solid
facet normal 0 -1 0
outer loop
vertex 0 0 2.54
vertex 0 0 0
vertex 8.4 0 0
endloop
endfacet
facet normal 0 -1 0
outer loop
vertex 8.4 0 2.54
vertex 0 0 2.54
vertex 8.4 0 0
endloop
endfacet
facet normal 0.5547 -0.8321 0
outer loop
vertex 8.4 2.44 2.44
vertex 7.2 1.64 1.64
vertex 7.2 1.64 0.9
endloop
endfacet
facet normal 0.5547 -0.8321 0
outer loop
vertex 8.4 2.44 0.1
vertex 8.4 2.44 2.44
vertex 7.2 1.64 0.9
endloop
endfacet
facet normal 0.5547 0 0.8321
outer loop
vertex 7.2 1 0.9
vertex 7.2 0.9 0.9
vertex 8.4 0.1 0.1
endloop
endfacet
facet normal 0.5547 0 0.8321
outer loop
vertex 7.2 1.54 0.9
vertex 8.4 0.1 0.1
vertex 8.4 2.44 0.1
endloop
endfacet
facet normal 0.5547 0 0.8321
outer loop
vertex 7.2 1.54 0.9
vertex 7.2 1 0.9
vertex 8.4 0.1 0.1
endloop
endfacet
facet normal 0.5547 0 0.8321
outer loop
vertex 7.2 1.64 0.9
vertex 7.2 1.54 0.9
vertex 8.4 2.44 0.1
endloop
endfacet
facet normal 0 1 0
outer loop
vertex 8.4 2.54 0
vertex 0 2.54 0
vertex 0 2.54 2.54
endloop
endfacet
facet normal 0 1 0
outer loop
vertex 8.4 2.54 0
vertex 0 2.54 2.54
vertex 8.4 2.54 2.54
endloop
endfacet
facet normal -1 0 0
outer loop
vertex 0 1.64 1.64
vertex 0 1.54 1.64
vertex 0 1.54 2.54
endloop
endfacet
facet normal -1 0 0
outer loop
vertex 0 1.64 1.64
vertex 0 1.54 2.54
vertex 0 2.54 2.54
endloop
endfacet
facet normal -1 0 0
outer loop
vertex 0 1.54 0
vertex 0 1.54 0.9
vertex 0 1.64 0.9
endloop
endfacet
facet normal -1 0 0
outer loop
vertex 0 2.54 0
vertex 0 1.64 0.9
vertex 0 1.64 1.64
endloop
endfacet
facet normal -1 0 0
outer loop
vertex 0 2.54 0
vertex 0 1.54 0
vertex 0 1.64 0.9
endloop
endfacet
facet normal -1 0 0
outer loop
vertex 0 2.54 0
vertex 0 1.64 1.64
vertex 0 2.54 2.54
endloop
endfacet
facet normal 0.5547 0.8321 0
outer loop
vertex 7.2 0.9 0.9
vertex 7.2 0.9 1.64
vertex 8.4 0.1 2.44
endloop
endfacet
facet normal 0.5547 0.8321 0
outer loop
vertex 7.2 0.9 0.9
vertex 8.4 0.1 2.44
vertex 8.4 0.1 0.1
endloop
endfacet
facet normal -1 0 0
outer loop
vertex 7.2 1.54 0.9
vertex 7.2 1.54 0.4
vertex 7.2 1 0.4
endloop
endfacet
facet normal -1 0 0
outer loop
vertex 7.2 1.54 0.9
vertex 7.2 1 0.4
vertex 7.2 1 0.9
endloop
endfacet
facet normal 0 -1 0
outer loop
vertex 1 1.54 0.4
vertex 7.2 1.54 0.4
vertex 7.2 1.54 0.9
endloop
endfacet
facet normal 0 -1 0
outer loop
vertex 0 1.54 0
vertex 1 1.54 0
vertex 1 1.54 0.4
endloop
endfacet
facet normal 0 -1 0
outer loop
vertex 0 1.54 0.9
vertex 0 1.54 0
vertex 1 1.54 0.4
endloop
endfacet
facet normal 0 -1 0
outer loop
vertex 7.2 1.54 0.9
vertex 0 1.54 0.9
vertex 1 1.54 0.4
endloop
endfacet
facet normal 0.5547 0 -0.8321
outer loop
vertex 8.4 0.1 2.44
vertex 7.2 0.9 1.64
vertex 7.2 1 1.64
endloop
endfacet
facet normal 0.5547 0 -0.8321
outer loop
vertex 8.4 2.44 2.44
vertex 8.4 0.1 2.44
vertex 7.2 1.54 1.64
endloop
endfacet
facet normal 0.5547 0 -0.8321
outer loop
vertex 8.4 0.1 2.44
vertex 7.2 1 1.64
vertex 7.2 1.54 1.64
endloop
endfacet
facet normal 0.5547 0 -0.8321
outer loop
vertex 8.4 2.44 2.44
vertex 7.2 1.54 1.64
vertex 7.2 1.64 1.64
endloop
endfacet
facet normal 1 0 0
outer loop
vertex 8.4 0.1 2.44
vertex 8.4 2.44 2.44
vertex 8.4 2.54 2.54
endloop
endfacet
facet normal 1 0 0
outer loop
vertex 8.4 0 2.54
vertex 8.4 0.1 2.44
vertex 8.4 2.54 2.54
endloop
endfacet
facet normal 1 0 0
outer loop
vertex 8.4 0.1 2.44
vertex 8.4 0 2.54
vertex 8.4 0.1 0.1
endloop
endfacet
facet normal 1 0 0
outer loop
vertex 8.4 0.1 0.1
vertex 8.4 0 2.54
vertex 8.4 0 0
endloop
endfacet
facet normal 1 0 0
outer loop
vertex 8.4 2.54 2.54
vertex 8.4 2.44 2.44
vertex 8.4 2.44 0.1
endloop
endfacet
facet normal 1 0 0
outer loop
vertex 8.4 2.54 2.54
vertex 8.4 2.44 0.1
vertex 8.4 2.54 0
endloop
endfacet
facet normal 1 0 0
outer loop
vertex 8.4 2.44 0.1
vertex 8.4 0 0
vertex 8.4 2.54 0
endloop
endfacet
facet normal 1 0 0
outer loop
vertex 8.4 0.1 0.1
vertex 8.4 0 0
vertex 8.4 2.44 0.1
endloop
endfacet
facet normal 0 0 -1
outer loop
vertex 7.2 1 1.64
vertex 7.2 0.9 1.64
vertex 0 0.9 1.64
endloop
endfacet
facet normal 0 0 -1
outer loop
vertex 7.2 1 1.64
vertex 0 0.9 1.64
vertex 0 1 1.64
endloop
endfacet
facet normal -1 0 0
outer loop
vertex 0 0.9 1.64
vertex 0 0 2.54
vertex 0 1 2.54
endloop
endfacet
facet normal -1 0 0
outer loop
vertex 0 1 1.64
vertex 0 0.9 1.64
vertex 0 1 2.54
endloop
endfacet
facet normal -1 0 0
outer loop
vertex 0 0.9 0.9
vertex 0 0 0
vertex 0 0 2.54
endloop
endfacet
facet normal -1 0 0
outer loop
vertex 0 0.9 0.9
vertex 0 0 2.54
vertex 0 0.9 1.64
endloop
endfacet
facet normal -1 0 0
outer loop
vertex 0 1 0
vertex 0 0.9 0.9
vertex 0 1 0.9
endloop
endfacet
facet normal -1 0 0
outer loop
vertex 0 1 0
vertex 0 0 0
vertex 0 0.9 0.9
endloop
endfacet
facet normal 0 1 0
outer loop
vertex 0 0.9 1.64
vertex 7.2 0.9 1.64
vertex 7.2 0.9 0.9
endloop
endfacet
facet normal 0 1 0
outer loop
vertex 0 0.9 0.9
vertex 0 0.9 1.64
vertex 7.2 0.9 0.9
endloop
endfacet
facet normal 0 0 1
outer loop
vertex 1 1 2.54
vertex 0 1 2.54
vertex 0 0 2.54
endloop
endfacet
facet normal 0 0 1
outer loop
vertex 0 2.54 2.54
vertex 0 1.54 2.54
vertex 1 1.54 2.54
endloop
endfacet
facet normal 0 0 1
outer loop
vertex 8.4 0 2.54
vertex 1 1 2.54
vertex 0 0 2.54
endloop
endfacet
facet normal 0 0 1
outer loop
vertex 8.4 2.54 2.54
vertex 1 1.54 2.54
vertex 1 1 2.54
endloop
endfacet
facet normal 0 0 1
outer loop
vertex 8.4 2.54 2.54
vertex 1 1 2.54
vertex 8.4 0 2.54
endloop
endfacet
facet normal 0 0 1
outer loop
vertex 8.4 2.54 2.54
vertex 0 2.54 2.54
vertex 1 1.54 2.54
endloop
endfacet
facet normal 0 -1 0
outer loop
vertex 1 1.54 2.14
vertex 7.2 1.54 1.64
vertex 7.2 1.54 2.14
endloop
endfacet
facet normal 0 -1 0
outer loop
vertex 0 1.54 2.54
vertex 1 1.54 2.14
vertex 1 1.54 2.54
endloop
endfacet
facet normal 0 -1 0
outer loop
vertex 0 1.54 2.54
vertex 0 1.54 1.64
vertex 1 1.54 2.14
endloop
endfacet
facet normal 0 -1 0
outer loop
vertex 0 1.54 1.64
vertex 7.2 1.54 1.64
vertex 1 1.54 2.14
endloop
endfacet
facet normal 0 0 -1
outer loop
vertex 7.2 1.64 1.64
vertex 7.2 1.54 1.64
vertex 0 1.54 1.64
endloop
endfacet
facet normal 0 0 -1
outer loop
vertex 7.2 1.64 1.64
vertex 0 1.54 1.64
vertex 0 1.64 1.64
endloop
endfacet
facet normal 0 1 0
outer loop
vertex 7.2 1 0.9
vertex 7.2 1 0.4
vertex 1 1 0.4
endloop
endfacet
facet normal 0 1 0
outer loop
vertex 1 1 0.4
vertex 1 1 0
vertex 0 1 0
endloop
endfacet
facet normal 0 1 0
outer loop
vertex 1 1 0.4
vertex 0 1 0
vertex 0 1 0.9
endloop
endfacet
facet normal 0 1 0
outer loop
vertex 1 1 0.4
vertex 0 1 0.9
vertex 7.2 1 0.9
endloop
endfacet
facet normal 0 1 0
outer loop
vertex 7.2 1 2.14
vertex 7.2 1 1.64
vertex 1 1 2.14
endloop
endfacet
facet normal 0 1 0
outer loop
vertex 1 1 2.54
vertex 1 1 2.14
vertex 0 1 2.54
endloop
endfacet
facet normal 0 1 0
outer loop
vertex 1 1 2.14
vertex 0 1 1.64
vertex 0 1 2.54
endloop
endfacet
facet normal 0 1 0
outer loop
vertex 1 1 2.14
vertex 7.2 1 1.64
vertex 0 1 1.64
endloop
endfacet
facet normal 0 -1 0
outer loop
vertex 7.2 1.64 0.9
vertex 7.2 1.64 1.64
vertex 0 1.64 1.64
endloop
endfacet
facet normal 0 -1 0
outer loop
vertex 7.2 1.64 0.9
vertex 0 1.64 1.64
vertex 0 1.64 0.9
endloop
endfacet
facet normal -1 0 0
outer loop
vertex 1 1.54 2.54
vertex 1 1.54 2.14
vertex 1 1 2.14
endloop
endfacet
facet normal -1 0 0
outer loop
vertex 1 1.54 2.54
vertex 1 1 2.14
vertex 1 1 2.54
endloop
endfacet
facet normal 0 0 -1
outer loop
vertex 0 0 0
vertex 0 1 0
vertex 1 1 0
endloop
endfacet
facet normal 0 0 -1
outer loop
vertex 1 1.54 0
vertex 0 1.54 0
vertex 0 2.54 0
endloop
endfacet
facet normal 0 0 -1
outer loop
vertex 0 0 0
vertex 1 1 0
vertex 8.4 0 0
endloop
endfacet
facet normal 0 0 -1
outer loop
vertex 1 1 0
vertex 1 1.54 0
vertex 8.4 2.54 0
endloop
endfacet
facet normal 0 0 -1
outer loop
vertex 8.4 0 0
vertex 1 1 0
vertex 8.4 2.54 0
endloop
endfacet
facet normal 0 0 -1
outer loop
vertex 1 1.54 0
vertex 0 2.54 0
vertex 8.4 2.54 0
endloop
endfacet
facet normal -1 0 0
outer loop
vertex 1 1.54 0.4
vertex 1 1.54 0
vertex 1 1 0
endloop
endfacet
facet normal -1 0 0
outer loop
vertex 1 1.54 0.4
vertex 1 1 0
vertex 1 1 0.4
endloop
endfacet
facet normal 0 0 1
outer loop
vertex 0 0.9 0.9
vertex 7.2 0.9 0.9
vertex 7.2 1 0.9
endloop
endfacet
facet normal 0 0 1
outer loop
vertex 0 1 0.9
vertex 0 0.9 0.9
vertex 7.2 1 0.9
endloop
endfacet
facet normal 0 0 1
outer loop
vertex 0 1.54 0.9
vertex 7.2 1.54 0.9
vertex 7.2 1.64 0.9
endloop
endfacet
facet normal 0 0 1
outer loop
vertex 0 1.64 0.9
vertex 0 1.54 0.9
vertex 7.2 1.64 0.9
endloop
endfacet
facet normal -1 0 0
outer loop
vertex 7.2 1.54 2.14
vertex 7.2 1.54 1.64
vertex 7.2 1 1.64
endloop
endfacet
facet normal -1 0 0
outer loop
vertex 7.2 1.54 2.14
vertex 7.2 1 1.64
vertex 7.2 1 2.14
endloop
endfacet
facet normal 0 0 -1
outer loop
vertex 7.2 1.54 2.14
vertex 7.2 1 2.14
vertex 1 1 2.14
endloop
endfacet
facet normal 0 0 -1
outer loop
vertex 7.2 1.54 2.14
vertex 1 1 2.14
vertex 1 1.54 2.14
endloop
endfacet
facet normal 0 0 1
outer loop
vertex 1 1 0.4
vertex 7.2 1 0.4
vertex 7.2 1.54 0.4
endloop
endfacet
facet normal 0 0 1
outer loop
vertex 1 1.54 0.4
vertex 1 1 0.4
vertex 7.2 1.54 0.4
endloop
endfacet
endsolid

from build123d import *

# Parameters (mm, degrees)
SKETCH1_W           = 8.4
SKETCH1_H           = 2.54
BOSS_EXTRUDE1_DEPTH = 2.54
CUT_EXTRUDE1_REACH  = 10.4
SKETCH2_W           = 0.74
SKETCH2_H           = 0.74
CHAMFER2_SIZE       = 0.8
CHAMFER2_SIZE2      = 1.2
SKETCH3_W           = 2.54
SKETCH3_H           = 0.54
CUT_EXTRUDE2_DEPTH  = 1
CUT_EXTRUDE4_START  = -6.2
SKETCH5_W           = 1.74
SKETCH5_H           = 0.54
CUT_EXTRUDE4_DEPTH  = 6.2


with BuildPart() as part:
    # Sketch1 → Boss-Extrude1 (new body)
    with BuildSketch(Plane.XY):
        with Locations((4.2, 1.27)):
            Rectangle(SKETCH1_W, SKETCH1_H)
    extrude(amount=BOSS_EXTRUDE1_DEPTH)

    # Sketch2 → Cut-Extrude1 (cut, up to next)
    with BuildSketch(Plane(origin=(8.4, 0, 0), x_dir=(0, 0, -1), z_dir=(1, 0, 0)), mode=Mode.PRIVATE) as cut_extrude1_sk1:
        with Locations((-1.27, 1.27)):
            Rectangle(SKETCH2_W, SKETCH2_H)
    cut_extrude1_tool1 = extrude(cut_extrude1_sk1.sketch, amount=-CUT_EXTRUDE1_REACH, mode=Mode.PRIVATE) & part.part
    add(cut_extrude1_tool1.solids().sort_by_distance((8.4, 1.27, 1.27))[0], mode=Mode.SUBTRACT)

    # Chamfer2
    chamfer2_edges = [part.edges().sort_by_distance(p)[0] for p in [
        (8.4, 1.27, 1.64),
        (8.4, 0.9, 1.27),
        (8.4, 1.27, 0.9),
        (8.4, 1.64, 1.27),
    ]]
    chamfer2_side = [part.faces().sort_by_distance(p)[0] for p in [
        (8.4, 0.035921024, 1.27),
    ]]
    chamfer(chamfer2_edges, length=CHAMFER2_SIZE, length2=CHAMFER2_SIZE2, reference=chamfer2_side[0])

    # Sketch3 → Cut-Extrude2 (cut)
    with BuildSketch(Plane.ZY):
        with Locations((1.27, 1.27)):
            Rectangle(SKETCH3_W, SKETCH3_H)
    extrude(amount=-CUT_EXTRUDE2_DEPTH, mode=Mode.SUBTRACT)

    # Sketch5 → Cut-Extrude4 (cut)
    with BuildSketch(Plane.ZY.offset(-1).offset(CUT_EXTRUDE4_START)):
        with Locations((1.27, 1.27)):
            Rectangle(SKETCH5_W, SKETCH5_H)
    extrude(amount=CUT_EXTRUDE4_DEPTH, mode=Mode.SUBTRACT)


solid = part.part
